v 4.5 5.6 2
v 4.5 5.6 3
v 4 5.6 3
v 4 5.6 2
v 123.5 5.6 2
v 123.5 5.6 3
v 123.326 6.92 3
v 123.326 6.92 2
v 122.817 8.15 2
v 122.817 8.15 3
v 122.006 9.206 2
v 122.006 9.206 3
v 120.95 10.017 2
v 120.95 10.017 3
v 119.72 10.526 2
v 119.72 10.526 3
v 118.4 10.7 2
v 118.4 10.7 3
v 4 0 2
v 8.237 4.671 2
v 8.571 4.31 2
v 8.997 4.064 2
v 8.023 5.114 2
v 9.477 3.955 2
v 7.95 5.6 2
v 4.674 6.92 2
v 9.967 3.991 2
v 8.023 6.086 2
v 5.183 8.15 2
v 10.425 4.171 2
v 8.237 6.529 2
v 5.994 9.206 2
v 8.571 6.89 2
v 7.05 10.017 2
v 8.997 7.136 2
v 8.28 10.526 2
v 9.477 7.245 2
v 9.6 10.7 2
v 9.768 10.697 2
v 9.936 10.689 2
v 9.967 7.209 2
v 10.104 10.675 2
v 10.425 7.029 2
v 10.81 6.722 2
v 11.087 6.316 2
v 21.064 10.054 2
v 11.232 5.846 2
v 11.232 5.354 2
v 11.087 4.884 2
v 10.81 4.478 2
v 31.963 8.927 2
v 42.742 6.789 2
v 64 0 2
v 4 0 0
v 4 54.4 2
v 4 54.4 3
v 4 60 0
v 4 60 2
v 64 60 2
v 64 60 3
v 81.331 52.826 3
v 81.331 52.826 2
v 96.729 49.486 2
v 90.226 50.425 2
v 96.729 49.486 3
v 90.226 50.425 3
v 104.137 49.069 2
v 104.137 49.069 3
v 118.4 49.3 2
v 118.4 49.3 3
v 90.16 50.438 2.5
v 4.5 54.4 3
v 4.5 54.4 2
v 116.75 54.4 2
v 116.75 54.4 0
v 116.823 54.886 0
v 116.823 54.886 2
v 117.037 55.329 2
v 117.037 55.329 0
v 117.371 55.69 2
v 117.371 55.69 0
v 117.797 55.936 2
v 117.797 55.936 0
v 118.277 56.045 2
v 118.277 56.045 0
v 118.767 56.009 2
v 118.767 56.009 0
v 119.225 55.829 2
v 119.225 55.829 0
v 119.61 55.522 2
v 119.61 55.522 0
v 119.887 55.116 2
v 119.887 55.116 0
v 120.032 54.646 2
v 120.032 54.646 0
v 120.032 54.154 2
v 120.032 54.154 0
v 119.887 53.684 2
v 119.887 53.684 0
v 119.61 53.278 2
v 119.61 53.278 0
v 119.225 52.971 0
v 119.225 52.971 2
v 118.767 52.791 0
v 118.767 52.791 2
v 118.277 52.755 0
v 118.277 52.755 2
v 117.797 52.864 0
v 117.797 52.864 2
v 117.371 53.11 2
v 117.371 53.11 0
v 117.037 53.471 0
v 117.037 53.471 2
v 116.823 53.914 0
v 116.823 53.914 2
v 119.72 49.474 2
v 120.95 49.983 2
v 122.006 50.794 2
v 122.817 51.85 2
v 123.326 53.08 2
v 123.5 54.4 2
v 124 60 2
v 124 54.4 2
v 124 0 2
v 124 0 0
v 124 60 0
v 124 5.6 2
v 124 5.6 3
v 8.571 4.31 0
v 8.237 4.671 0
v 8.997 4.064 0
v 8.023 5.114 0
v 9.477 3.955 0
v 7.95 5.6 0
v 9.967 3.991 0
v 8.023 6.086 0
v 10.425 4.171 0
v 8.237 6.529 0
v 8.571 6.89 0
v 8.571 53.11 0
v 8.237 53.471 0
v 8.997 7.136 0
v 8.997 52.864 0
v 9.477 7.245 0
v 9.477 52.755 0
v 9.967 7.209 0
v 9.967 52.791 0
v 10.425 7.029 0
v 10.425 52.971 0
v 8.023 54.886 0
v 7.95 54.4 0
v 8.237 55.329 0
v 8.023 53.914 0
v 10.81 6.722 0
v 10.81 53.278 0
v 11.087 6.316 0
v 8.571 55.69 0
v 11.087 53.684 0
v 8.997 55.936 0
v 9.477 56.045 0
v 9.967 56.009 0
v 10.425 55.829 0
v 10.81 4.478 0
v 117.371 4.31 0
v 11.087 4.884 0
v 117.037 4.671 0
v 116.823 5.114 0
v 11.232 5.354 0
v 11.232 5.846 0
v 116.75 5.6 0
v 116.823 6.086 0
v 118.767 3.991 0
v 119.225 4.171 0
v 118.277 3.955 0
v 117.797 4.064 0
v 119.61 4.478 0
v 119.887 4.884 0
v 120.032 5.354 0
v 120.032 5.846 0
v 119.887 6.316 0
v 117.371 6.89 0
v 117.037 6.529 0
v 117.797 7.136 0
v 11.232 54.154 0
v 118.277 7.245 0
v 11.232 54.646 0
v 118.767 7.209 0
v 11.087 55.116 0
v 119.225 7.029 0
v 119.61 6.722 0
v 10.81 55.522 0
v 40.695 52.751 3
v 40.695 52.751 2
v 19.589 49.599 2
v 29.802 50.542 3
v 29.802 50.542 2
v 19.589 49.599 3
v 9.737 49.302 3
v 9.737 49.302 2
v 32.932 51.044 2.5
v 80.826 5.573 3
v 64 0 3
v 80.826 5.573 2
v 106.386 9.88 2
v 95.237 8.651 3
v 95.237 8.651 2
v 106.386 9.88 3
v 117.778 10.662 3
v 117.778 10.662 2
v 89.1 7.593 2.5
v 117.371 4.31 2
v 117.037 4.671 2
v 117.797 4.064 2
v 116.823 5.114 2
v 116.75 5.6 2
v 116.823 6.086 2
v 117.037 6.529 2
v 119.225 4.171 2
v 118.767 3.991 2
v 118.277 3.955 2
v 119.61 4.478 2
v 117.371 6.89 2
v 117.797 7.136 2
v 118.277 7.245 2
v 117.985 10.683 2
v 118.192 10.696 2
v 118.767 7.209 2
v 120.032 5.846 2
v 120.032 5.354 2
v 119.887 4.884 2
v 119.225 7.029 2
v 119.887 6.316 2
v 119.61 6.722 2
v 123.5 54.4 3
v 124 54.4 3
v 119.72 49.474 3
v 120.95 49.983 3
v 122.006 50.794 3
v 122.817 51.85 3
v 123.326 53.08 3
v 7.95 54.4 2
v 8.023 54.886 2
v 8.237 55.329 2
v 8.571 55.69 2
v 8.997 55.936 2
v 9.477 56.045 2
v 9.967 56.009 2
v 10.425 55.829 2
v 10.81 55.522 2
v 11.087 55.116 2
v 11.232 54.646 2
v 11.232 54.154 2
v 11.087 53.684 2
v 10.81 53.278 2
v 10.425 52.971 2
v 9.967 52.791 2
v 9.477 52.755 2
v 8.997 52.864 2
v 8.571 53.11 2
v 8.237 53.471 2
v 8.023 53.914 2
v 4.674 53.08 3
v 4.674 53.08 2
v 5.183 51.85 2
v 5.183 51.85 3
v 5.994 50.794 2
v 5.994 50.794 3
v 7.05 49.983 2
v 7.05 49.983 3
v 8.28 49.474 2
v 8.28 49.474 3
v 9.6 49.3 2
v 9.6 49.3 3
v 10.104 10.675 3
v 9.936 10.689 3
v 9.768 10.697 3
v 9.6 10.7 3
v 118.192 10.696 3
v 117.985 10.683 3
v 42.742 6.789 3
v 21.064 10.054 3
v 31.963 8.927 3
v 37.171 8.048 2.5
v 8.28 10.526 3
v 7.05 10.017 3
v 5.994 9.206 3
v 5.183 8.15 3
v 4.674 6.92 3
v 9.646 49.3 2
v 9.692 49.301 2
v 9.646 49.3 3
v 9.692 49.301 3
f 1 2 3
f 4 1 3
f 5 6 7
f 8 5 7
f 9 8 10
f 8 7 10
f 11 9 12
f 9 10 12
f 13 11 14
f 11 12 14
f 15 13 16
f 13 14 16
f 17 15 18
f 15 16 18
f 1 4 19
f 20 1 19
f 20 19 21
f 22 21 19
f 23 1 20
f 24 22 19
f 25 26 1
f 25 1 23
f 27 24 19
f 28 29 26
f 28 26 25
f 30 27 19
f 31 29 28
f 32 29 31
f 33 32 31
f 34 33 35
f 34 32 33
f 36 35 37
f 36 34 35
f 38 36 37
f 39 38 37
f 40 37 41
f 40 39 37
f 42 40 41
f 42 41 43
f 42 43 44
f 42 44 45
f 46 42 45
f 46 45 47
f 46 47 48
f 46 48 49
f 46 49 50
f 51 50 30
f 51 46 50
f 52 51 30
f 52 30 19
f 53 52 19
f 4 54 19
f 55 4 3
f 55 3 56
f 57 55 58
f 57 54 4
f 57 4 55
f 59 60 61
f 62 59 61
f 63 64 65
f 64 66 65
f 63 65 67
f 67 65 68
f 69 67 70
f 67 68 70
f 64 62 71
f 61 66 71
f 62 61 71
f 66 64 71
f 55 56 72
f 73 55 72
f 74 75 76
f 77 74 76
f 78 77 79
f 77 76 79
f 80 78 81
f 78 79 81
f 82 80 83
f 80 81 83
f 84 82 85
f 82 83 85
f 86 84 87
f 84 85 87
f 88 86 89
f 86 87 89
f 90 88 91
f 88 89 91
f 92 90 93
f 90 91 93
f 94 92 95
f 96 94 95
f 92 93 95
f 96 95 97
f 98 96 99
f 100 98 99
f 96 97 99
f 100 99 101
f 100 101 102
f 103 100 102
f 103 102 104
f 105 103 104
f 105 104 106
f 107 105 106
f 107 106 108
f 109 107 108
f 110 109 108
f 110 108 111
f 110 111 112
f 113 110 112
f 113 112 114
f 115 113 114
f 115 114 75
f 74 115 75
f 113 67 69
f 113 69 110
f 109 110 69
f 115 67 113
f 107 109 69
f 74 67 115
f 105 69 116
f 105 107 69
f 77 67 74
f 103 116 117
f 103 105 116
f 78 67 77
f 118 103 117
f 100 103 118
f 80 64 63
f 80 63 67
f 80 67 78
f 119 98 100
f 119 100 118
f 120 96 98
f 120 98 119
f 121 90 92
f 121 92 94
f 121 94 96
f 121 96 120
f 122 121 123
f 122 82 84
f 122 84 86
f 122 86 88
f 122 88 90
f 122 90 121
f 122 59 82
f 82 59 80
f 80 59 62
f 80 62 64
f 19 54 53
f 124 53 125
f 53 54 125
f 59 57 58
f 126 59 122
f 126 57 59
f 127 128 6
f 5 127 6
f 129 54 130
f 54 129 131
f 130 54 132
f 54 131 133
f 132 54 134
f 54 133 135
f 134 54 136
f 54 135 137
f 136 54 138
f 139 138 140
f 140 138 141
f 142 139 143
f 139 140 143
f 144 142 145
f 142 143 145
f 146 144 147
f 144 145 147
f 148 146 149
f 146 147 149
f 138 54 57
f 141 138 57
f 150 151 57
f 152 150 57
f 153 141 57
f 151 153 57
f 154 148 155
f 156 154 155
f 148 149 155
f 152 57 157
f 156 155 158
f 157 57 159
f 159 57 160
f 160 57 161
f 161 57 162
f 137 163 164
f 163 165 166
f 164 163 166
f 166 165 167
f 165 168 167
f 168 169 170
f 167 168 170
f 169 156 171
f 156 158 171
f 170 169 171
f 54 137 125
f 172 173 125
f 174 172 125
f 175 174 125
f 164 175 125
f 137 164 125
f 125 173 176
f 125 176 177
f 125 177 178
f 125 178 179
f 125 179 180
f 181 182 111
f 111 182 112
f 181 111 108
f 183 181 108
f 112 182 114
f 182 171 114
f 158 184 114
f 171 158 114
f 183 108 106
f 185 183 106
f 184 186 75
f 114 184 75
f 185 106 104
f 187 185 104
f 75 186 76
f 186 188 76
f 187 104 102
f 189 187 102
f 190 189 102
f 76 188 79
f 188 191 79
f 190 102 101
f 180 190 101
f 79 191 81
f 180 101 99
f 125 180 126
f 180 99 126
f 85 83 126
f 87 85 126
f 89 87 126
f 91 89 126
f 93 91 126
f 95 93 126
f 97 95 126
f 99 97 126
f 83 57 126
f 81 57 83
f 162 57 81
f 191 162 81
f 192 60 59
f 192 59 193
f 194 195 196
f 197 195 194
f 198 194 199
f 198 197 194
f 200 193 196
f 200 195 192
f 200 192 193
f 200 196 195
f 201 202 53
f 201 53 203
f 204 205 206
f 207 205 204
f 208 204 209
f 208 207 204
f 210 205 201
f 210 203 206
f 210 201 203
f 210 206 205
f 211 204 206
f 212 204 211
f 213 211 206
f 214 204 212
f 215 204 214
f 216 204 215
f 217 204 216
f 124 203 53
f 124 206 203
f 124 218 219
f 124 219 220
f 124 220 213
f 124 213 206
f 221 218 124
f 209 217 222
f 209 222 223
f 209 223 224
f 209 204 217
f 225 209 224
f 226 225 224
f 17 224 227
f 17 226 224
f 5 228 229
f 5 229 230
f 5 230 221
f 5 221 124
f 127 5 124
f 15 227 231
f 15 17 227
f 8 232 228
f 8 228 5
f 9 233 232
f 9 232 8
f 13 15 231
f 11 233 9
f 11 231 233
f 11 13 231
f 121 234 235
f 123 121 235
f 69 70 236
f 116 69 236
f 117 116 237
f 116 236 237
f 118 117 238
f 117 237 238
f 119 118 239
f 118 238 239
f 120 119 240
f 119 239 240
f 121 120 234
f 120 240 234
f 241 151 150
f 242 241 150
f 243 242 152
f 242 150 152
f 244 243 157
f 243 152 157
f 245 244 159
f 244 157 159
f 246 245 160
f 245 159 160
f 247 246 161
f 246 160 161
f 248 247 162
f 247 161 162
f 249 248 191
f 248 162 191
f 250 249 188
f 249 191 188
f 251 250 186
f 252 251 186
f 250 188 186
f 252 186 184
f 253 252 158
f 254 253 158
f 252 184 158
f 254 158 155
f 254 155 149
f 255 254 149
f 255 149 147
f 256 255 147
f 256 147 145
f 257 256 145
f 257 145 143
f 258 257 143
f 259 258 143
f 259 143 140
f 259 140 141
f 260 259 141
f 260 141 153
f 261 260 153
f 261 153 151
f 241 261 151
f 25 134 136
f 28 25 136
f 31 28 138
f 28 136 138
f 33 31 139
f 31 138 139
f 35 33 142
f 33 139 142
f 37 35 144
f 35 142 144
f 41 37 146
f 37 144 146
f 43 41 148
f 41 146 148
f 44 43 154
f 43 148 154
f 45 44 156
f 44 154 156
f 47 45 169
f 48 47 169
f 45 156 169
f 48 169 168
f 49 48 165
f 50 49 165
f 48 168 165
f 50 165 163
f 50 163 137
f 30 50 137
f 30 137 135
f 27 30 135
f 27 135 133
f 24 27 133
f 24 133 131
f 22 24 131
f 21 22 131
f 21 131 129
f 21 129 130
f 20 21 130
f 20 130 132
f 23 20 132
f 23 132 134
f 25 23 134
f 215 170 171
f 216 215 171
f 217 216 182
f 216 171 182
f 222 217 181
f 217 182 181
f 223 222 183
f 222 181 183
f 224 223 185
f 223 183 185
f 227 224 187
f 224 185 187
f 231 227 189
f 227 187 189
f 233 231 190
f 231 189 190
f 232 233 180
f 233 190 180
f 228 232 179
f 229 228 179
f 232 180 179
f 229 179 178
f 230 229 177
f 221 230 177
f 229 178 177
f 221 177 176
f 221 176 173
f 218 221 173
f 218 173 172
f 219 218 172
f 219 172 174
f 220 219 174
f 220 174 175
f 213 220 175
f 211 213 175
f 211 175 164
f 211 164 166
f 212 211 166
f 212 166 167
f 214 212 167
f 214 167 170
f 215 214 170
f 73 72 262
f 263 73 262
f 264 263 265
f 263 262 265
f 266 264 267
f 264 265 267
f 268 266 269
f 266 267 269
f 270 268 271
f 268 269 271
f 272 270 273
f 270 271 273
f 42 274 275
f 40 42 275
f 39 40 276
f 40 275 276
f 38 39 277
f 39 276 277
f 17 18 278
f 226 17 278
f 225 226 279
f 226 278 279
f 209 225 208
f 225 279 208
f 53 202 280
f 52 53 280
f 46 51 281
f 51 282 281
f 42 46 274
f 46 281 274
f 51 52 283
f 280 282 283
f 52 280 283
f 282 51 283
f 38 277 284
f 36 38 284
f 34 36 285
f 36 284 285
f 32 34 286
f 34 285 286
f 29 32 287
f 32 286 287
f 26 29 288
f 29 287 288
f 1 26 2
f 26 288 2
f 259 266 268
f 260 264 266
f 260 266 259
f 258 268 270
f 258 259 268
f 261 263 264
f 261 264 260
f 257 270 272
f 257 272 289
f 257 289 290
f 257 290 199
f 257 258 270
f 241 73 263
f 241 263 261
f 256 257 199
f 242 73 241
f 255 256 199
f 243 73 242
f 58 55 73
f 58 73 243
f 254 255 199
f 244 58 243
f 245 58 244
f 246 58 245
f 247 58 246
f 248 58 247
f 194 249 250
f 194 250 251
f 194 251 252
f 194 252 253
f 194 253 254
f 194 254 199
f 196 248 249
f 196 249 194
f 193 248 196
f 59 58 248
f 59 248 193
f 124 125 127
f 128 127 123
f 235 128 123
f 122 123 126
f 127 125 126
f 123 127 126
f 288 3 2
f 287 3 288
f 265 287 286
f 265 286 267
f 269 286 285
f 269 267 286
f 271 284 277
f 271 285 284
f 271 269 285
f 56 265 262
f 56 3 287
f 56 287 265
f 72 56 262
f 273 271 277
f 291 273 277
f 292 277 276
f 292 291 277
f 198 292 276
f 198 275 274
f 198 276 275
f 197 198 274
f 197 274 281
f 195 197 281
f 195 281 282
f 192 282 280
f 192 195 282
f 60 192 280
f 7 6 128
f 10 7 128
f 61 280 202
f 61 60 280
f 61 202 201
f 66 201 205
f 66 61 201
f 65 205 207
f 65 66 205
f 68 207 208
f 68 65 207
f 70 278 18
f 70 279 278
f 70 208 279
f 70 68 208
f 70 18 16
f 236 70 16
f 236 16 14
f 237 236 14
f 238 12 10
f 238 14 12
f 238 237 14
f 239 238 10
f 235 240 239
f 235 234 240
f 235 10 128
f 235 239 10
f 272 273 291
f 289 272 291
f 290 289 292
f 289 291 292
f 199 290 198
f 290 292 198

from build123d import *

# Parameters (mm, degrees)
F0_W     = 120
F0_H     = 60
F1_DEPTH = 3
F3_DEPTH = 1
F5_DEPTH = 1
F6_D     = 3.3
F7_D     = 3.3


with BuildPart() as f1:
    # F0 (on Top) → F1 (new body)
    with BuildSketch(Plane.XY):
        with Locations((63.9999989198, 30)):
            Rectangle(F0_W, F0_H)
    extrude(amount=F1_DEPTH)

    # F2 (on face) → F3 (cut)
    with BuildSketch(Plane.XY.offset(3)):
        with BuildLine():
            ThreePointArc((14.6999989198, 54.4), (13.2062435039, 58.0062445841), (9.5999989198, 59.5))
            Line((9.5999989198, 59.5), (9.5999989198, 54.4))
            Line((9.5999989198, 54.4), (14.6999989198, 54.4))
        make_face()
        with BuildLine():
            Line((9.5999989198, 49.3), (9.5999989198, 54.4))
            Line((9.5999989198, 54.4), (4.4999989198, 54.4))
            ThreePointArc((4.4999989198, 54.4), (5.9937543357, 50.7937554159), (9.5999989198, 49.3))
        make_face()
        with BuildLine():
            Line((14.6999989198, 54.4), (9.5999989198, 54.4))
            Line((9.5999989198, 54.4), (9.5999989198, 49.3))
            ThreePointArc((9.5999989198, 49.3), (13.2062435039, 50.7937554159), (14.6999989198, 54.4))
        make_face()
        with BuildLine():
            Line((9.5999989198, 5.6), (9.5999989198, 10.7))
            ThreePointArc((9.5999989198, 10.7), (5.9937543357, 9.2062445841), (4.4999989198, 5.6))
            Line((4.4999989198, 5.6), (9.5999989198, 5.6))
        make_face()
        with BuildLine():
            ThreePointArc((14.6999989198, 5.6), (13.2062435039, 9.2062445841), (9.5999989198, 10.7))
            Line((9.5999989198, 10.7), (9.5999989198, 5.6))
            Line((9.5999989198, 5.6), (14.6999989198, 5.6))
        make_face()
        with BuildLine():
            Line((9.5999989198, 5.6), (4.4999989198, 5.6))
            ThreePointArc((4.4999989198, 5.6), (5.9937543357, 1.9937554159), (9.5999989198, 0.5))
            Line((9.5999989198, 0.5), (9.5999989198, 5.6))
        make_face()
        with BuildLine():
            Line((14.6999989198, 5.6), (9.5999989198, 5.6))
            Line((9.5999989198, 5.6), (9.5999989198, 0.5))
            ThreePointArc((9.5999989198, 0.5), (13.2062435039, 1.9937554159), (14.6999989198, 5.6))
        make_face()
        with BuildLine():
            Line((118.3999989198, 5.6), (118.3999989198, 10.7))
            ThreePointArc((118.3999989198, 10.7), (114.7937543357, 9.2062445841), (113.2999989198, 5.6))
            Line((113.2999989198, 5.6), (118.3999989198, 5.6))
        make_face()
        with BuildLine():
            Line((118.3999989198, 5.6), (113.2999989198, 5.6))
            ThreePointArc((113.2999989198, 5.6), (114.7937543357, 1.9937554159), (118.3999989198, 0.5))
            Line((118.3999989198, 0.5), (118.3999989198, 5.6))
        make_face()
        with BuildLine():
            ThreePointArc((123.4999989198, 5.6), (122.0062435039, 9.2062445841), (118.3999989198, 10.7))
            Line((118.3999989198, 10.7), (118.3999989198, 5.6))
            Line((118.3999989198, 5.6), (123.4999989198, 5.6))
        make_face()
        with BuildLine():
            ThreePointArc((118.3999989198, 0.5), (122.0062435039, 1.9937554159), (123.4999989198, 5.6))
            Line((123.4999989198, 5.6), (118.3999989198, 5.6))
            Line((118.3999989198, 5.6), (118.3999989198, 0.5))
        make_face()
        with BuildLine():
            Line((118.3999989198, 54.4), (118.3999989198, 59.5))
            ThreePointArc((118.3999989198, 59.5), (114.7937543357, 58.0062445841), (113.2999989198, 54.4))
            Line((113.2999989198, 54.4), (118.3999989198, 54.4))
        make_face()
        with BuildLine():
            Line((118.3999989198, 54.4), (113.2999989198, 54.4))
            ThreePointArc((113.2999989198, 54.4), (114.7937543357, 50.7937554159), (118.3999989198, 49.3))
            Line((118.3999989198, 49.3), (118.3999989198, 54.4))
        make_face()
        with BuildLine():
            ThreePointArc((123.4999989198, 54.4), (122.0062435039, 58.0062445841), (118.3999989198, 59.5))
            Line((118.3999989198, 59.5), (118.3999989198, 54.4))
            Line((118.3999989198, 54.4), (123.4999989198, 54.4))
        make_face()
        with BuildLine():
            Line((123.4999989198, 54.4), (118.3999989198, 54.4))
            Line((118.3999989198, 54.4), (118.3999989198, 49.3))
            ThreePointArc((118.3999989198, 49.3), (122.0062435039, 50.7937554159), (123.4999989198, 54.4))
        make_face()
        with BuildLine():
            Line((9.5999989198, 54.4), (9.5999989198, 59.5))
            ThreePointArc((9.5999989198, 59.5), (5.9937543357, 58.0062445841), (4.4999989198, 54.4))
            Line((4.4999989198, 54.4), (9.5999989198, 54.4))
        make_face()
        with BuildLine():
            Line((9.5999989198, 59.5), (9.5999989198, 60))
            Line((9.5999989198, 60), (3.9999989198, 60))
            Line((3.9999989198, 60), (3.9999989198, 54.4))
            Line((3.9999989198, 54.4), (4.4999989198, 54.4))
            ThreePointArc((4.4999989198, 54.4), (5.9937543357, 58.0062445841), (9.5999989198, 59.5))
        make_face()
        with BuildLine():
            Line((123.9999989198, 60), (118.3999989198, 60))
            Line((118.3999989198, 60), (118.3999989198, 59.5))
            ThreePointArc((118.3999989198, 59.5), (122.0062435039, 58.0062445841), (123.4999989198, 54.4))
            Line((123.4999989198, 54.4), (123.9999989198, 54.4))
            Line((123.9999989198, 54.4), (123.9999989198, 60))
        make_face()
        with BuildLine():
            Line((123.9999989198, 0), (123.9999989198, 5.6))
            Line((123.9999989198, 5.6), (123.4999989198, 5.6))
            ThreePointArc((123.4999989198, 5.6), (122.0062435039, 1.9937554159), (118.3999989198, 0.5))
            Line((118.3999989198, 0.5), (118.3999989198, 0))
            Line((118.3999989198, 0), (123.9999989198, 0))
        make_face()
        with BuildLine():
            Line((4.4999989198, 5.6), (3.9999989198, 5.6))
            Line((3.9999989198, 5.6), (3.9999989198, 0))
            Line((3.9999989198, 0), (9.5999989198, 0))
            Line((9.5999989198, 0), (9.5999989198, 0.5))
            ThreePointArc((9.5999989198, 0.5), (5.9937543357, 1.9937554159), (4.4999989198, 5.6))
        make_face()
    extrude(amount=-F3_DEPTH, mode=Mode.SUBTRACT)

    # F4 (on face) → F5 (cut)
    with BuildSketch(Plane.XY.offset(3)):
        with BuildLine():
            add(Edge.make_bspline(
                [(63.9999989198, 60), (53.3078499409, 56.3984259531), (33.5495887668, 49.7075267127), (17.2264214287, 49.4590057291), (9.7372470228, 49.3018471033)],
                knots=[0, 0, 0, 0, 0.5410756029, 1, 1, 1, 1], degree=3))
            Line((63.9999989198, 60), (9.5999989198, 60))
            Line((9.5999989198, 60), (9.5999989198, 59.5))
            ThreePointArc((9.5999989198, 59.5), (14.6995371231, 54.4686302658), (9.7372470228, 49.3018471033))
        make_face()
        with BuildLine():
            Line((118.3999989198, 60), (63.9999989198, 60))
            add(Edge.make_bspline(
                [(63.9999989198, 60), (72.5641843861, 56.1127336818), (89.7555419494, 48.3096115422), (108.8285530179, 48.9690651334), (118.3999989198, 49.3)],
                knots=[0, 0, 0, 0, 0.4981680728, 1, 1, 1, 1], degree=3))
            ThreePointArc((118.3999989198, 49.3), (113.2999989198, 54.4), (118.3999989198, 59.5))
            Line((118.3999989198, 59.5), (118.3999989198, 60))
        make_face()
        with BuildLine():
            add(Edge.make_bspline(
                [(63.9999989198, 0), (72.1609270774, 2.9084131067), (88.7930843444, 8.835825192), (107.9878966542, 10.0624659865), (117.7781419332, 10.6619456623)],
                knots=[0, 0, 0, 0, 0.4854368856, 0.9893314178, 0.9893314178, 0.9893314178, 0.9893314178], degree=3))
            Line((63.9999989198, 0), (118.3999989198, 0))
            Line((118.3999989198, 0), (118.3999989198, 0.5))
            ThreePointArc((118.3999989198, 0.5), (113.3095213942, 5.28848987), (117.7781419332, 10.6619456623))
        make_face()
        with BuildLine():
            add(Edge.make_bspline(
                [(63.9999989198, 0), (55.110608048, 3.1316324942), (37.4637794456, 9.3648834823), (19.1775133134, 10.2247717324), (10.1042544322, 10.675009988)],
                knots=[0, 0, 0, 0, 0.5036943289, 1, 1, 1, 1], degree=3))
            ThreePointArc((10.1042544322, 10.675009988), (14.6937475855, 5.3475628185), (9.5999989198, 0.5))
            Line((9.5999989198, 0.5), (9.5999989198, 0))
            Line((9.5999989198, 0), (63.9999989198, 0))
        make_face()
    extrude(amount=-F5_DEPTH, mode=Mode.SUBTRACT)

    # F6 (through all)
    with Locations(Plane.XY.offset(3)):
        with Locations((9.5999989198, 54.4)):
            Hole(F6_D / 2)

    # F7 (through all)
    with Locations(Plane.XY.offset(3)):
        with Locations((118.3999989198, 54.4), (118.3999989198, 5.6), (9.5999989198, 5.6)):
            Hole(F7_D / 2)


solid = f1.part
